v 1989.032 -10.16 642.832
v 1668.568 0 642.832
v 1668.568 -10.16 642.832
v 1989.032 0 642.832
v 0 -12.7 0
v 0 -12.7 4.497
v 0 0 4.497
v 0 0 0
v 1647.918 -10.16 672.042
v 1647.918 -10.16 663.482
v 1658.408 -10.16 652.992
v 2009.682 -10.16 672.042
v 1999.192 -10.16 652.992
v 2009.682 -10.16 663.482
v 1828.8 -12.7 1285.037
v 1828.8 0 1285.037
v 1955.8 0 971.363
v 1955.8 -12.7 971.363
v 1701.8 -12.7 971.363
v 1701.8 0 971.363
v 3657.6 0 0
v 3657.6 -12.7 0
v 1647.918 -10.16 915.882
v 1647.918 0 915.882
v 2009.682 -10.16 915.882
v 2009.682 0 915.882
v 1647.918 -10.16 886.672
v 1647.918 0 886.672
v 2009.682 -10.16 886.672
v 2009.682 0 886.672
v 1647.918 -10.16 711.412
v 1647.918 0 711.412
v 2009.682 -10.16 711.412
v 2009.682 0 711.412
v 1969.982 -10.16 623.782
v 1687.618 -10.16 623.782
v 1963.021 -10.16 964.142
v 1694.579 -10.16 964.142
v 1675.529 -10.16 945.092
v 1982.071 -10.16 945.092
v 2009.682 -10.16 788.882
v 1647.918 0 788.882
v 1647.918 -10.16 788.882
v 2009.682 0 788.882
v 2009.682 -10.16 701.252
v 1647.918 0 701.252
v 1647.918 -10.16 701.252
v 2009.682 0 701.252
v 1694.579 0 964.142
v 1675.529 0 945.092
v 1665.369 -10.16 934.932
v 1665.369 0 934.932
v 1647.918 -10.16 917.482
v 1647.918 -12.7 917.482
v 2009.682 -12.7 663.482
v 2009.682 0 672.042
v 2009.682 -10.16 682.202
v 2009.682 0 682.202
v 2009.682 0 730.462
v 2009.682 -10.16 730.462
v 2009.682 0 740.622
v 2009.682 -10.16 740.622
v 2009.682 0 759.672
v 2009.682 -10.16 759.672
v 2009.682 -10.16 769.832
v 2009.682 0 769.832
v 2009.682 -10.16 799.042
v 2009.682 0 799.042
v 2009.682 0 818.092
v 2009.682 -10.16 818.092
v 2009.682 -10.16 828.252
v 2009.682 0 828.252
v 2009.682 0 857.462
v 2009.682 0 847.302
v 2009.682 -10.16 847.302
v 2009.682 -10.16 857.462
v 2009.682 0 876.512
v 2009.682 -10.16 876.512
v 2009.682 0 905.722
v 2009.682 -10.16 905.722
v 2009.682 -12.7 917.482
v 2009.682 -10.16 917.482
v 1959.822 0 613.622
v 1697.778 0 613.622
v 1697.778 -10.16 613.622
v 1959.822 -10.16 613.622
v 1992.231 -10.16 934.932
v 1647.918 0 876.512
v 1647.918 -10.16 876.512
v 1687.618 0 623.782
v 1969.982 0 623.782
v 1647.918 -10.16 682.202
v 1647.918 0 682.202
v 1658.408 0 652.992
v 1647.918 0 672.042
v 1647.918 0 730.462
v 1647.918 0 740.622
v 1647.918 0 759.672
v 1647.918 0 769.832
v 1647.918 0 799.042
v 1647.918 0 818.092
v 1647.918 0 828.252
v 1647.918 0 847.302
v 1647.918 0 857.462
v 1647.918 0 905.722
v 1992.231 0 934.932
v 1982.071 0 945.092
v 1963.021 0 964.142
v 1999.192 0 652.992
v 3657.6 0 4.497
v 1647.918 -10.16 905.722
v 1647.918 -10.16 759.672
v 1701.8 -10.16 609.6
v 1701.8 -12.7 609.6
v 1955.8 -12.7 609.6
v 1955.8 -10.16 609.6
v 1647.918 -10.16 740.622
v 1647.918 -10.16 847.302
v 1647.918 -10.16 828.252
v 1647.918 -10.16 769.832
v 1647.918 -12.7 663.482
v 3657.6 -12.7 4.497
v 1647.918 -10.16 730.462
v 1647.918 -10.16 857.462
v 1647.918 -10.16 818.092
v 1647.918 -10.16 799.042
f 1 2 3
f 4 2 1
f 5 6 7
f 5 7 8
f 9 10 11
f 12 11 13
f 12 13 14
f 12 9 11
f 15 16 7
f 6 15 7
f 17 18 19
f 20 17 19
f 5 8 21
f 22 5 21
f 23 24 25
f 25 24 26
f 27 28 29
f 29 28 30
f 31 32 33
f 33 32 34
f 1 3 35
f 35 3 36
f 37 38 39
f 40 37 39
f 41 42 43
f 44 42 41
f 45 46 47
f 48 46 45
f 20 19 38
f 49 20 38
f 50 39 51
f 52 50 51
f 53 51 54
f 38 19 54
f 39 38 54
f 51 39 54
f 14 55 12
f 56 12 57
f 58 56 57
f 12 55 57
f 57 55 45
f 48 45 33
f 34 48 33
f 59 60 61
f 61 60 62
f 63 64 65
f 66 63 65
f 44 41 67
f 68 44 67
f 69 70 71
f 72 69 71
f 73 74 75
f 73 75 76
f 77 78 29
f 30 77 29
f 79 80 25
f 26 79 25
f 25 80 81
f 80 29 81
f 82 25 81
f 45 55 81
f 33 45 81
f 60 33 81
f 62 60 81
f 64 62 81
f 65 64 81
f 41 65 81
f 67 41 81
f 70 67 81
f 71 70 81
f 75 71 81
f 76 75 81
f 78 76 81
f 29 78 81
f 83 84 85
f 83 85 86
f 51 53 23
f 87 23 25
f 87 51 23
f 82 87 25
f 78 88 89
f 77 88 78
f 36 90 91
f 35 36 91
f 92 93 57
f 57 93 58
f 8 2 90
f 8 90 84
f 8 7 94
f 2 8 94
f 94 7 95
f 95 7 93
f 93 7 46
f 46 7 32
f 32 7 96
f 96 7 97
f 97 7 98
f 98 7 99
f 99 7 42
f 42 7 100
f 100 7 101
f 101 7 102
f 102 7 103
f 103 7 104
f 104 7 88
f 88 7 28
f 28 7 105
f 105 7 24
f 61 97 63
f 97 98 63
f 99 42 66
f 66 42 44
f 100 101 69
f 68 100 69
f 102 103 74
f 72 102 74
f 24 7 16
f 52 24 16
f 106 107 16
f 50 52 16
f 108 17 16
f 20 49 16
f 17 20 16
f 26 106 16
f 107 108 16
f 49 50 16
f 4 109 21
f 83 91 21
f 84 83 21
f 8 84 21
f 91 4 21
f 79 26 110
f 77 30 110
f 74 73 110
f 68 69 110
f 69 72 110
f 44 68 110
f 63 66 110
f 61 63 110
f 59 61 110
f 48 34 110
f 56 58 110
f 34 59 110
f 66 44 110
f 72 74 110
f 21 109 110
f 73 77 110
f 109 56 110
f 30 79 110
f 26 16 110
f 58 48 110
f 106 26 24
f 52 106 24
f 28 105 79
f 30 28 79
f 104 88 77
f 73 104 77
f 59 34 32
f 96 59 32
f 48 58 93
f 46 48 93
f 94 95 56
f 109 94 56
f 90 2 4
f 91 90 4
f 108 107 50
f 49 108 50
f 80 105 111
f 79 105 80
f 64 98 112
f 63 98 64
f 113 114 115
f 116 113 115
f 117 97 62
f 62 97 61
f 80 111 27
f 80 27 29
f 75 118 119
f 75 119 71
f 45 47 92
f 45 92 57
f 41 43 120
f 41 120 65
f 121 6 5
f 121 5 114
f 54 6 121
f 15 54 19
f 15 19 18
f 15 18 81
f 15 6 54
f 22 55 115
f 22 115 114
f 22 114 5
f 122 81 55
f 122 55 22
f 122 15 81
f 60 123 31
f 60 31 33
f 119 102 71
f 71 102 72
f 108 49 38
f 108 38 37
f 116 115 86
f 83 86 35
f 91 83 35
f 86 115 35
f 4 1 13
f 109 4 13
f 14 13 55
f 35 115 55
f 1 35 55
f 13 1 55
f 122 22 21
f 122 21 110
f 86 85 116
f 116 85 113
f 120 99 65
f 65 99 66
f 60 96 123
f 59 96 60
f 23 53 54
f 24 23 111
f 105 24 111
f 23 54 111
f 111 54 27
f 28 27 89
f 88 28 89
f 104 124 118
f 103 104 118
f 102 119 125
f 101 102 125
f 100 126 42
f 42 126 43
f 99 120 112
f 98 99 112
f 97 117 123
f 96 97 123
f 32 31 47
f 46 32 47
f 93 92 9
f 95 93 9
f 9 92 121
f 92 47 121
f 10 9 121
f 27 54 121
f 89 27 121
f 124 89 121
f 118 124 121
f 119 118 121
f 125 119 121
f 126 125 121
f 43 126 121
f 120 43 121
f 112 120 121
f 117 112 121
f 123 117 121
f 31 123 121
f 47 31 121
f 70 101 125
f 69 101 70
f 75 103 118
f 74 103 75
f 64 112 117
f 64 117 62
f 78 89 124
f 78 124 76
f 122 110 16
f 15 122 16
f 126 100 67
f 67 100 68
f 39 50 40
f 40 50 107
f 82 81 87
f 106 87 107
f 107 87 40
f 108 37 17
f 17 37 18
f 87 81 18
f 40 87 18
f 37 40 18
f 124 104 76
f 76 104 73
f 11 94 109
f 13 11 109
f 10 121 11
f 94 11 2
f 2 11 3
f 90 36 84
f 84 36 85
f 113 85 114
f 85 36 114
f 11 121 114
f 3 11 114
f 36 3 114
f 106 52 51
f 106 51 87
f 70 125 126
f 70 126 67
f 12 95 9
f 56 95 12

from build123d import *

# Parameters (mm, degrees)
F1_DEPTH = 12.7
F3_DEPTH = 89.662
F4_W     = 609.6
F4_H     = 19.05
F5_DEPTH = 10.16


with BuildPart() as f1:
    # F0 (on Front) → F1 (new body)
    with BuildSketch(Plane.XZ):
        Polygon((0, 4.497254), (0, 0), (1828.8, 0), (1828.8, 1285.0368), align=None)
        Polygon((1828.8, 1285.0368), (1828.8, 0), (3657.6, 0), (3657.6, 4.497254), align=None)
    extrude(amount=F1_DEPTH)

    # F2 (on face) → F3 (cut)
    with BuildSketch(Plane.XZ.offset(12.7)):
        Polygon((1647.918463, 917.481537), (1647.918463, 790.481537), (2009.681537, 790.481537), (2009.681537, 917.481537), (1955.8, 971.363073), (1701.8, 971.363073), align=None)
        Polygon((1647.918463, 663.481537), (1701.8, 609.6), (1955.8, 609.6), (2009.681537, 663.481537), (2009.681537, 790.481537), (1647.918463, 790.481537), align=None)
    extrude(amount=-F3_DEPTH, mode=Mode.SUBTRACT)

    # F4 (on Front) → F5 (join)
    with BuildSketch(Plane.XZ):
        with Locations((1828.8, 954.617365)):
            Rectangle(F4_W, F4_H)
        with Locations((1828.8, 925.407365)):
            Rectangle(F4_W, F4_H)
        with Locations((1828.8, 896.197365)):
            Rectangle(F4_W, F4_H)
        with Locations((1828.8, 866.987365)):
            Rectangle(F4_W, F4_H)
        with Locations((1828.8, 837.777365)):
            Rectangle(F4_W, F4_H)
        with Locations((1828.8, 808.567365)):
            Rectangle(F4_W, F4_H)
        with Locations((1828.8, 779.357365)):
            Rectangle(F4_W, F4_H)
        with Locations((1828.8, 750.147365)):
            Rectangle(F4_W, F4_H)
        with Locations((1828.8, 720.937365)):
            Rectangle(F4_W, F4_H)
        with Locations((1828.8, 691.727365)):
            Rectangle(F4_W, F4_H)
        with Locations((1828.8, 662.517365)):
            Rectangle(F4_W, F4_H)
        with Locations((1828.8, 633.307365)):
            Rectangle(F4_W, F4_H)
        with Locations((1828.8, 604.097365)):
            Rectangle(F4_W, F4_H)
        with Locations((1828.8, 574.887365)):
            Rectangle(F4_W, F4_H)
    extrude(amount=F5_DEPTH)


solid = f1.part
